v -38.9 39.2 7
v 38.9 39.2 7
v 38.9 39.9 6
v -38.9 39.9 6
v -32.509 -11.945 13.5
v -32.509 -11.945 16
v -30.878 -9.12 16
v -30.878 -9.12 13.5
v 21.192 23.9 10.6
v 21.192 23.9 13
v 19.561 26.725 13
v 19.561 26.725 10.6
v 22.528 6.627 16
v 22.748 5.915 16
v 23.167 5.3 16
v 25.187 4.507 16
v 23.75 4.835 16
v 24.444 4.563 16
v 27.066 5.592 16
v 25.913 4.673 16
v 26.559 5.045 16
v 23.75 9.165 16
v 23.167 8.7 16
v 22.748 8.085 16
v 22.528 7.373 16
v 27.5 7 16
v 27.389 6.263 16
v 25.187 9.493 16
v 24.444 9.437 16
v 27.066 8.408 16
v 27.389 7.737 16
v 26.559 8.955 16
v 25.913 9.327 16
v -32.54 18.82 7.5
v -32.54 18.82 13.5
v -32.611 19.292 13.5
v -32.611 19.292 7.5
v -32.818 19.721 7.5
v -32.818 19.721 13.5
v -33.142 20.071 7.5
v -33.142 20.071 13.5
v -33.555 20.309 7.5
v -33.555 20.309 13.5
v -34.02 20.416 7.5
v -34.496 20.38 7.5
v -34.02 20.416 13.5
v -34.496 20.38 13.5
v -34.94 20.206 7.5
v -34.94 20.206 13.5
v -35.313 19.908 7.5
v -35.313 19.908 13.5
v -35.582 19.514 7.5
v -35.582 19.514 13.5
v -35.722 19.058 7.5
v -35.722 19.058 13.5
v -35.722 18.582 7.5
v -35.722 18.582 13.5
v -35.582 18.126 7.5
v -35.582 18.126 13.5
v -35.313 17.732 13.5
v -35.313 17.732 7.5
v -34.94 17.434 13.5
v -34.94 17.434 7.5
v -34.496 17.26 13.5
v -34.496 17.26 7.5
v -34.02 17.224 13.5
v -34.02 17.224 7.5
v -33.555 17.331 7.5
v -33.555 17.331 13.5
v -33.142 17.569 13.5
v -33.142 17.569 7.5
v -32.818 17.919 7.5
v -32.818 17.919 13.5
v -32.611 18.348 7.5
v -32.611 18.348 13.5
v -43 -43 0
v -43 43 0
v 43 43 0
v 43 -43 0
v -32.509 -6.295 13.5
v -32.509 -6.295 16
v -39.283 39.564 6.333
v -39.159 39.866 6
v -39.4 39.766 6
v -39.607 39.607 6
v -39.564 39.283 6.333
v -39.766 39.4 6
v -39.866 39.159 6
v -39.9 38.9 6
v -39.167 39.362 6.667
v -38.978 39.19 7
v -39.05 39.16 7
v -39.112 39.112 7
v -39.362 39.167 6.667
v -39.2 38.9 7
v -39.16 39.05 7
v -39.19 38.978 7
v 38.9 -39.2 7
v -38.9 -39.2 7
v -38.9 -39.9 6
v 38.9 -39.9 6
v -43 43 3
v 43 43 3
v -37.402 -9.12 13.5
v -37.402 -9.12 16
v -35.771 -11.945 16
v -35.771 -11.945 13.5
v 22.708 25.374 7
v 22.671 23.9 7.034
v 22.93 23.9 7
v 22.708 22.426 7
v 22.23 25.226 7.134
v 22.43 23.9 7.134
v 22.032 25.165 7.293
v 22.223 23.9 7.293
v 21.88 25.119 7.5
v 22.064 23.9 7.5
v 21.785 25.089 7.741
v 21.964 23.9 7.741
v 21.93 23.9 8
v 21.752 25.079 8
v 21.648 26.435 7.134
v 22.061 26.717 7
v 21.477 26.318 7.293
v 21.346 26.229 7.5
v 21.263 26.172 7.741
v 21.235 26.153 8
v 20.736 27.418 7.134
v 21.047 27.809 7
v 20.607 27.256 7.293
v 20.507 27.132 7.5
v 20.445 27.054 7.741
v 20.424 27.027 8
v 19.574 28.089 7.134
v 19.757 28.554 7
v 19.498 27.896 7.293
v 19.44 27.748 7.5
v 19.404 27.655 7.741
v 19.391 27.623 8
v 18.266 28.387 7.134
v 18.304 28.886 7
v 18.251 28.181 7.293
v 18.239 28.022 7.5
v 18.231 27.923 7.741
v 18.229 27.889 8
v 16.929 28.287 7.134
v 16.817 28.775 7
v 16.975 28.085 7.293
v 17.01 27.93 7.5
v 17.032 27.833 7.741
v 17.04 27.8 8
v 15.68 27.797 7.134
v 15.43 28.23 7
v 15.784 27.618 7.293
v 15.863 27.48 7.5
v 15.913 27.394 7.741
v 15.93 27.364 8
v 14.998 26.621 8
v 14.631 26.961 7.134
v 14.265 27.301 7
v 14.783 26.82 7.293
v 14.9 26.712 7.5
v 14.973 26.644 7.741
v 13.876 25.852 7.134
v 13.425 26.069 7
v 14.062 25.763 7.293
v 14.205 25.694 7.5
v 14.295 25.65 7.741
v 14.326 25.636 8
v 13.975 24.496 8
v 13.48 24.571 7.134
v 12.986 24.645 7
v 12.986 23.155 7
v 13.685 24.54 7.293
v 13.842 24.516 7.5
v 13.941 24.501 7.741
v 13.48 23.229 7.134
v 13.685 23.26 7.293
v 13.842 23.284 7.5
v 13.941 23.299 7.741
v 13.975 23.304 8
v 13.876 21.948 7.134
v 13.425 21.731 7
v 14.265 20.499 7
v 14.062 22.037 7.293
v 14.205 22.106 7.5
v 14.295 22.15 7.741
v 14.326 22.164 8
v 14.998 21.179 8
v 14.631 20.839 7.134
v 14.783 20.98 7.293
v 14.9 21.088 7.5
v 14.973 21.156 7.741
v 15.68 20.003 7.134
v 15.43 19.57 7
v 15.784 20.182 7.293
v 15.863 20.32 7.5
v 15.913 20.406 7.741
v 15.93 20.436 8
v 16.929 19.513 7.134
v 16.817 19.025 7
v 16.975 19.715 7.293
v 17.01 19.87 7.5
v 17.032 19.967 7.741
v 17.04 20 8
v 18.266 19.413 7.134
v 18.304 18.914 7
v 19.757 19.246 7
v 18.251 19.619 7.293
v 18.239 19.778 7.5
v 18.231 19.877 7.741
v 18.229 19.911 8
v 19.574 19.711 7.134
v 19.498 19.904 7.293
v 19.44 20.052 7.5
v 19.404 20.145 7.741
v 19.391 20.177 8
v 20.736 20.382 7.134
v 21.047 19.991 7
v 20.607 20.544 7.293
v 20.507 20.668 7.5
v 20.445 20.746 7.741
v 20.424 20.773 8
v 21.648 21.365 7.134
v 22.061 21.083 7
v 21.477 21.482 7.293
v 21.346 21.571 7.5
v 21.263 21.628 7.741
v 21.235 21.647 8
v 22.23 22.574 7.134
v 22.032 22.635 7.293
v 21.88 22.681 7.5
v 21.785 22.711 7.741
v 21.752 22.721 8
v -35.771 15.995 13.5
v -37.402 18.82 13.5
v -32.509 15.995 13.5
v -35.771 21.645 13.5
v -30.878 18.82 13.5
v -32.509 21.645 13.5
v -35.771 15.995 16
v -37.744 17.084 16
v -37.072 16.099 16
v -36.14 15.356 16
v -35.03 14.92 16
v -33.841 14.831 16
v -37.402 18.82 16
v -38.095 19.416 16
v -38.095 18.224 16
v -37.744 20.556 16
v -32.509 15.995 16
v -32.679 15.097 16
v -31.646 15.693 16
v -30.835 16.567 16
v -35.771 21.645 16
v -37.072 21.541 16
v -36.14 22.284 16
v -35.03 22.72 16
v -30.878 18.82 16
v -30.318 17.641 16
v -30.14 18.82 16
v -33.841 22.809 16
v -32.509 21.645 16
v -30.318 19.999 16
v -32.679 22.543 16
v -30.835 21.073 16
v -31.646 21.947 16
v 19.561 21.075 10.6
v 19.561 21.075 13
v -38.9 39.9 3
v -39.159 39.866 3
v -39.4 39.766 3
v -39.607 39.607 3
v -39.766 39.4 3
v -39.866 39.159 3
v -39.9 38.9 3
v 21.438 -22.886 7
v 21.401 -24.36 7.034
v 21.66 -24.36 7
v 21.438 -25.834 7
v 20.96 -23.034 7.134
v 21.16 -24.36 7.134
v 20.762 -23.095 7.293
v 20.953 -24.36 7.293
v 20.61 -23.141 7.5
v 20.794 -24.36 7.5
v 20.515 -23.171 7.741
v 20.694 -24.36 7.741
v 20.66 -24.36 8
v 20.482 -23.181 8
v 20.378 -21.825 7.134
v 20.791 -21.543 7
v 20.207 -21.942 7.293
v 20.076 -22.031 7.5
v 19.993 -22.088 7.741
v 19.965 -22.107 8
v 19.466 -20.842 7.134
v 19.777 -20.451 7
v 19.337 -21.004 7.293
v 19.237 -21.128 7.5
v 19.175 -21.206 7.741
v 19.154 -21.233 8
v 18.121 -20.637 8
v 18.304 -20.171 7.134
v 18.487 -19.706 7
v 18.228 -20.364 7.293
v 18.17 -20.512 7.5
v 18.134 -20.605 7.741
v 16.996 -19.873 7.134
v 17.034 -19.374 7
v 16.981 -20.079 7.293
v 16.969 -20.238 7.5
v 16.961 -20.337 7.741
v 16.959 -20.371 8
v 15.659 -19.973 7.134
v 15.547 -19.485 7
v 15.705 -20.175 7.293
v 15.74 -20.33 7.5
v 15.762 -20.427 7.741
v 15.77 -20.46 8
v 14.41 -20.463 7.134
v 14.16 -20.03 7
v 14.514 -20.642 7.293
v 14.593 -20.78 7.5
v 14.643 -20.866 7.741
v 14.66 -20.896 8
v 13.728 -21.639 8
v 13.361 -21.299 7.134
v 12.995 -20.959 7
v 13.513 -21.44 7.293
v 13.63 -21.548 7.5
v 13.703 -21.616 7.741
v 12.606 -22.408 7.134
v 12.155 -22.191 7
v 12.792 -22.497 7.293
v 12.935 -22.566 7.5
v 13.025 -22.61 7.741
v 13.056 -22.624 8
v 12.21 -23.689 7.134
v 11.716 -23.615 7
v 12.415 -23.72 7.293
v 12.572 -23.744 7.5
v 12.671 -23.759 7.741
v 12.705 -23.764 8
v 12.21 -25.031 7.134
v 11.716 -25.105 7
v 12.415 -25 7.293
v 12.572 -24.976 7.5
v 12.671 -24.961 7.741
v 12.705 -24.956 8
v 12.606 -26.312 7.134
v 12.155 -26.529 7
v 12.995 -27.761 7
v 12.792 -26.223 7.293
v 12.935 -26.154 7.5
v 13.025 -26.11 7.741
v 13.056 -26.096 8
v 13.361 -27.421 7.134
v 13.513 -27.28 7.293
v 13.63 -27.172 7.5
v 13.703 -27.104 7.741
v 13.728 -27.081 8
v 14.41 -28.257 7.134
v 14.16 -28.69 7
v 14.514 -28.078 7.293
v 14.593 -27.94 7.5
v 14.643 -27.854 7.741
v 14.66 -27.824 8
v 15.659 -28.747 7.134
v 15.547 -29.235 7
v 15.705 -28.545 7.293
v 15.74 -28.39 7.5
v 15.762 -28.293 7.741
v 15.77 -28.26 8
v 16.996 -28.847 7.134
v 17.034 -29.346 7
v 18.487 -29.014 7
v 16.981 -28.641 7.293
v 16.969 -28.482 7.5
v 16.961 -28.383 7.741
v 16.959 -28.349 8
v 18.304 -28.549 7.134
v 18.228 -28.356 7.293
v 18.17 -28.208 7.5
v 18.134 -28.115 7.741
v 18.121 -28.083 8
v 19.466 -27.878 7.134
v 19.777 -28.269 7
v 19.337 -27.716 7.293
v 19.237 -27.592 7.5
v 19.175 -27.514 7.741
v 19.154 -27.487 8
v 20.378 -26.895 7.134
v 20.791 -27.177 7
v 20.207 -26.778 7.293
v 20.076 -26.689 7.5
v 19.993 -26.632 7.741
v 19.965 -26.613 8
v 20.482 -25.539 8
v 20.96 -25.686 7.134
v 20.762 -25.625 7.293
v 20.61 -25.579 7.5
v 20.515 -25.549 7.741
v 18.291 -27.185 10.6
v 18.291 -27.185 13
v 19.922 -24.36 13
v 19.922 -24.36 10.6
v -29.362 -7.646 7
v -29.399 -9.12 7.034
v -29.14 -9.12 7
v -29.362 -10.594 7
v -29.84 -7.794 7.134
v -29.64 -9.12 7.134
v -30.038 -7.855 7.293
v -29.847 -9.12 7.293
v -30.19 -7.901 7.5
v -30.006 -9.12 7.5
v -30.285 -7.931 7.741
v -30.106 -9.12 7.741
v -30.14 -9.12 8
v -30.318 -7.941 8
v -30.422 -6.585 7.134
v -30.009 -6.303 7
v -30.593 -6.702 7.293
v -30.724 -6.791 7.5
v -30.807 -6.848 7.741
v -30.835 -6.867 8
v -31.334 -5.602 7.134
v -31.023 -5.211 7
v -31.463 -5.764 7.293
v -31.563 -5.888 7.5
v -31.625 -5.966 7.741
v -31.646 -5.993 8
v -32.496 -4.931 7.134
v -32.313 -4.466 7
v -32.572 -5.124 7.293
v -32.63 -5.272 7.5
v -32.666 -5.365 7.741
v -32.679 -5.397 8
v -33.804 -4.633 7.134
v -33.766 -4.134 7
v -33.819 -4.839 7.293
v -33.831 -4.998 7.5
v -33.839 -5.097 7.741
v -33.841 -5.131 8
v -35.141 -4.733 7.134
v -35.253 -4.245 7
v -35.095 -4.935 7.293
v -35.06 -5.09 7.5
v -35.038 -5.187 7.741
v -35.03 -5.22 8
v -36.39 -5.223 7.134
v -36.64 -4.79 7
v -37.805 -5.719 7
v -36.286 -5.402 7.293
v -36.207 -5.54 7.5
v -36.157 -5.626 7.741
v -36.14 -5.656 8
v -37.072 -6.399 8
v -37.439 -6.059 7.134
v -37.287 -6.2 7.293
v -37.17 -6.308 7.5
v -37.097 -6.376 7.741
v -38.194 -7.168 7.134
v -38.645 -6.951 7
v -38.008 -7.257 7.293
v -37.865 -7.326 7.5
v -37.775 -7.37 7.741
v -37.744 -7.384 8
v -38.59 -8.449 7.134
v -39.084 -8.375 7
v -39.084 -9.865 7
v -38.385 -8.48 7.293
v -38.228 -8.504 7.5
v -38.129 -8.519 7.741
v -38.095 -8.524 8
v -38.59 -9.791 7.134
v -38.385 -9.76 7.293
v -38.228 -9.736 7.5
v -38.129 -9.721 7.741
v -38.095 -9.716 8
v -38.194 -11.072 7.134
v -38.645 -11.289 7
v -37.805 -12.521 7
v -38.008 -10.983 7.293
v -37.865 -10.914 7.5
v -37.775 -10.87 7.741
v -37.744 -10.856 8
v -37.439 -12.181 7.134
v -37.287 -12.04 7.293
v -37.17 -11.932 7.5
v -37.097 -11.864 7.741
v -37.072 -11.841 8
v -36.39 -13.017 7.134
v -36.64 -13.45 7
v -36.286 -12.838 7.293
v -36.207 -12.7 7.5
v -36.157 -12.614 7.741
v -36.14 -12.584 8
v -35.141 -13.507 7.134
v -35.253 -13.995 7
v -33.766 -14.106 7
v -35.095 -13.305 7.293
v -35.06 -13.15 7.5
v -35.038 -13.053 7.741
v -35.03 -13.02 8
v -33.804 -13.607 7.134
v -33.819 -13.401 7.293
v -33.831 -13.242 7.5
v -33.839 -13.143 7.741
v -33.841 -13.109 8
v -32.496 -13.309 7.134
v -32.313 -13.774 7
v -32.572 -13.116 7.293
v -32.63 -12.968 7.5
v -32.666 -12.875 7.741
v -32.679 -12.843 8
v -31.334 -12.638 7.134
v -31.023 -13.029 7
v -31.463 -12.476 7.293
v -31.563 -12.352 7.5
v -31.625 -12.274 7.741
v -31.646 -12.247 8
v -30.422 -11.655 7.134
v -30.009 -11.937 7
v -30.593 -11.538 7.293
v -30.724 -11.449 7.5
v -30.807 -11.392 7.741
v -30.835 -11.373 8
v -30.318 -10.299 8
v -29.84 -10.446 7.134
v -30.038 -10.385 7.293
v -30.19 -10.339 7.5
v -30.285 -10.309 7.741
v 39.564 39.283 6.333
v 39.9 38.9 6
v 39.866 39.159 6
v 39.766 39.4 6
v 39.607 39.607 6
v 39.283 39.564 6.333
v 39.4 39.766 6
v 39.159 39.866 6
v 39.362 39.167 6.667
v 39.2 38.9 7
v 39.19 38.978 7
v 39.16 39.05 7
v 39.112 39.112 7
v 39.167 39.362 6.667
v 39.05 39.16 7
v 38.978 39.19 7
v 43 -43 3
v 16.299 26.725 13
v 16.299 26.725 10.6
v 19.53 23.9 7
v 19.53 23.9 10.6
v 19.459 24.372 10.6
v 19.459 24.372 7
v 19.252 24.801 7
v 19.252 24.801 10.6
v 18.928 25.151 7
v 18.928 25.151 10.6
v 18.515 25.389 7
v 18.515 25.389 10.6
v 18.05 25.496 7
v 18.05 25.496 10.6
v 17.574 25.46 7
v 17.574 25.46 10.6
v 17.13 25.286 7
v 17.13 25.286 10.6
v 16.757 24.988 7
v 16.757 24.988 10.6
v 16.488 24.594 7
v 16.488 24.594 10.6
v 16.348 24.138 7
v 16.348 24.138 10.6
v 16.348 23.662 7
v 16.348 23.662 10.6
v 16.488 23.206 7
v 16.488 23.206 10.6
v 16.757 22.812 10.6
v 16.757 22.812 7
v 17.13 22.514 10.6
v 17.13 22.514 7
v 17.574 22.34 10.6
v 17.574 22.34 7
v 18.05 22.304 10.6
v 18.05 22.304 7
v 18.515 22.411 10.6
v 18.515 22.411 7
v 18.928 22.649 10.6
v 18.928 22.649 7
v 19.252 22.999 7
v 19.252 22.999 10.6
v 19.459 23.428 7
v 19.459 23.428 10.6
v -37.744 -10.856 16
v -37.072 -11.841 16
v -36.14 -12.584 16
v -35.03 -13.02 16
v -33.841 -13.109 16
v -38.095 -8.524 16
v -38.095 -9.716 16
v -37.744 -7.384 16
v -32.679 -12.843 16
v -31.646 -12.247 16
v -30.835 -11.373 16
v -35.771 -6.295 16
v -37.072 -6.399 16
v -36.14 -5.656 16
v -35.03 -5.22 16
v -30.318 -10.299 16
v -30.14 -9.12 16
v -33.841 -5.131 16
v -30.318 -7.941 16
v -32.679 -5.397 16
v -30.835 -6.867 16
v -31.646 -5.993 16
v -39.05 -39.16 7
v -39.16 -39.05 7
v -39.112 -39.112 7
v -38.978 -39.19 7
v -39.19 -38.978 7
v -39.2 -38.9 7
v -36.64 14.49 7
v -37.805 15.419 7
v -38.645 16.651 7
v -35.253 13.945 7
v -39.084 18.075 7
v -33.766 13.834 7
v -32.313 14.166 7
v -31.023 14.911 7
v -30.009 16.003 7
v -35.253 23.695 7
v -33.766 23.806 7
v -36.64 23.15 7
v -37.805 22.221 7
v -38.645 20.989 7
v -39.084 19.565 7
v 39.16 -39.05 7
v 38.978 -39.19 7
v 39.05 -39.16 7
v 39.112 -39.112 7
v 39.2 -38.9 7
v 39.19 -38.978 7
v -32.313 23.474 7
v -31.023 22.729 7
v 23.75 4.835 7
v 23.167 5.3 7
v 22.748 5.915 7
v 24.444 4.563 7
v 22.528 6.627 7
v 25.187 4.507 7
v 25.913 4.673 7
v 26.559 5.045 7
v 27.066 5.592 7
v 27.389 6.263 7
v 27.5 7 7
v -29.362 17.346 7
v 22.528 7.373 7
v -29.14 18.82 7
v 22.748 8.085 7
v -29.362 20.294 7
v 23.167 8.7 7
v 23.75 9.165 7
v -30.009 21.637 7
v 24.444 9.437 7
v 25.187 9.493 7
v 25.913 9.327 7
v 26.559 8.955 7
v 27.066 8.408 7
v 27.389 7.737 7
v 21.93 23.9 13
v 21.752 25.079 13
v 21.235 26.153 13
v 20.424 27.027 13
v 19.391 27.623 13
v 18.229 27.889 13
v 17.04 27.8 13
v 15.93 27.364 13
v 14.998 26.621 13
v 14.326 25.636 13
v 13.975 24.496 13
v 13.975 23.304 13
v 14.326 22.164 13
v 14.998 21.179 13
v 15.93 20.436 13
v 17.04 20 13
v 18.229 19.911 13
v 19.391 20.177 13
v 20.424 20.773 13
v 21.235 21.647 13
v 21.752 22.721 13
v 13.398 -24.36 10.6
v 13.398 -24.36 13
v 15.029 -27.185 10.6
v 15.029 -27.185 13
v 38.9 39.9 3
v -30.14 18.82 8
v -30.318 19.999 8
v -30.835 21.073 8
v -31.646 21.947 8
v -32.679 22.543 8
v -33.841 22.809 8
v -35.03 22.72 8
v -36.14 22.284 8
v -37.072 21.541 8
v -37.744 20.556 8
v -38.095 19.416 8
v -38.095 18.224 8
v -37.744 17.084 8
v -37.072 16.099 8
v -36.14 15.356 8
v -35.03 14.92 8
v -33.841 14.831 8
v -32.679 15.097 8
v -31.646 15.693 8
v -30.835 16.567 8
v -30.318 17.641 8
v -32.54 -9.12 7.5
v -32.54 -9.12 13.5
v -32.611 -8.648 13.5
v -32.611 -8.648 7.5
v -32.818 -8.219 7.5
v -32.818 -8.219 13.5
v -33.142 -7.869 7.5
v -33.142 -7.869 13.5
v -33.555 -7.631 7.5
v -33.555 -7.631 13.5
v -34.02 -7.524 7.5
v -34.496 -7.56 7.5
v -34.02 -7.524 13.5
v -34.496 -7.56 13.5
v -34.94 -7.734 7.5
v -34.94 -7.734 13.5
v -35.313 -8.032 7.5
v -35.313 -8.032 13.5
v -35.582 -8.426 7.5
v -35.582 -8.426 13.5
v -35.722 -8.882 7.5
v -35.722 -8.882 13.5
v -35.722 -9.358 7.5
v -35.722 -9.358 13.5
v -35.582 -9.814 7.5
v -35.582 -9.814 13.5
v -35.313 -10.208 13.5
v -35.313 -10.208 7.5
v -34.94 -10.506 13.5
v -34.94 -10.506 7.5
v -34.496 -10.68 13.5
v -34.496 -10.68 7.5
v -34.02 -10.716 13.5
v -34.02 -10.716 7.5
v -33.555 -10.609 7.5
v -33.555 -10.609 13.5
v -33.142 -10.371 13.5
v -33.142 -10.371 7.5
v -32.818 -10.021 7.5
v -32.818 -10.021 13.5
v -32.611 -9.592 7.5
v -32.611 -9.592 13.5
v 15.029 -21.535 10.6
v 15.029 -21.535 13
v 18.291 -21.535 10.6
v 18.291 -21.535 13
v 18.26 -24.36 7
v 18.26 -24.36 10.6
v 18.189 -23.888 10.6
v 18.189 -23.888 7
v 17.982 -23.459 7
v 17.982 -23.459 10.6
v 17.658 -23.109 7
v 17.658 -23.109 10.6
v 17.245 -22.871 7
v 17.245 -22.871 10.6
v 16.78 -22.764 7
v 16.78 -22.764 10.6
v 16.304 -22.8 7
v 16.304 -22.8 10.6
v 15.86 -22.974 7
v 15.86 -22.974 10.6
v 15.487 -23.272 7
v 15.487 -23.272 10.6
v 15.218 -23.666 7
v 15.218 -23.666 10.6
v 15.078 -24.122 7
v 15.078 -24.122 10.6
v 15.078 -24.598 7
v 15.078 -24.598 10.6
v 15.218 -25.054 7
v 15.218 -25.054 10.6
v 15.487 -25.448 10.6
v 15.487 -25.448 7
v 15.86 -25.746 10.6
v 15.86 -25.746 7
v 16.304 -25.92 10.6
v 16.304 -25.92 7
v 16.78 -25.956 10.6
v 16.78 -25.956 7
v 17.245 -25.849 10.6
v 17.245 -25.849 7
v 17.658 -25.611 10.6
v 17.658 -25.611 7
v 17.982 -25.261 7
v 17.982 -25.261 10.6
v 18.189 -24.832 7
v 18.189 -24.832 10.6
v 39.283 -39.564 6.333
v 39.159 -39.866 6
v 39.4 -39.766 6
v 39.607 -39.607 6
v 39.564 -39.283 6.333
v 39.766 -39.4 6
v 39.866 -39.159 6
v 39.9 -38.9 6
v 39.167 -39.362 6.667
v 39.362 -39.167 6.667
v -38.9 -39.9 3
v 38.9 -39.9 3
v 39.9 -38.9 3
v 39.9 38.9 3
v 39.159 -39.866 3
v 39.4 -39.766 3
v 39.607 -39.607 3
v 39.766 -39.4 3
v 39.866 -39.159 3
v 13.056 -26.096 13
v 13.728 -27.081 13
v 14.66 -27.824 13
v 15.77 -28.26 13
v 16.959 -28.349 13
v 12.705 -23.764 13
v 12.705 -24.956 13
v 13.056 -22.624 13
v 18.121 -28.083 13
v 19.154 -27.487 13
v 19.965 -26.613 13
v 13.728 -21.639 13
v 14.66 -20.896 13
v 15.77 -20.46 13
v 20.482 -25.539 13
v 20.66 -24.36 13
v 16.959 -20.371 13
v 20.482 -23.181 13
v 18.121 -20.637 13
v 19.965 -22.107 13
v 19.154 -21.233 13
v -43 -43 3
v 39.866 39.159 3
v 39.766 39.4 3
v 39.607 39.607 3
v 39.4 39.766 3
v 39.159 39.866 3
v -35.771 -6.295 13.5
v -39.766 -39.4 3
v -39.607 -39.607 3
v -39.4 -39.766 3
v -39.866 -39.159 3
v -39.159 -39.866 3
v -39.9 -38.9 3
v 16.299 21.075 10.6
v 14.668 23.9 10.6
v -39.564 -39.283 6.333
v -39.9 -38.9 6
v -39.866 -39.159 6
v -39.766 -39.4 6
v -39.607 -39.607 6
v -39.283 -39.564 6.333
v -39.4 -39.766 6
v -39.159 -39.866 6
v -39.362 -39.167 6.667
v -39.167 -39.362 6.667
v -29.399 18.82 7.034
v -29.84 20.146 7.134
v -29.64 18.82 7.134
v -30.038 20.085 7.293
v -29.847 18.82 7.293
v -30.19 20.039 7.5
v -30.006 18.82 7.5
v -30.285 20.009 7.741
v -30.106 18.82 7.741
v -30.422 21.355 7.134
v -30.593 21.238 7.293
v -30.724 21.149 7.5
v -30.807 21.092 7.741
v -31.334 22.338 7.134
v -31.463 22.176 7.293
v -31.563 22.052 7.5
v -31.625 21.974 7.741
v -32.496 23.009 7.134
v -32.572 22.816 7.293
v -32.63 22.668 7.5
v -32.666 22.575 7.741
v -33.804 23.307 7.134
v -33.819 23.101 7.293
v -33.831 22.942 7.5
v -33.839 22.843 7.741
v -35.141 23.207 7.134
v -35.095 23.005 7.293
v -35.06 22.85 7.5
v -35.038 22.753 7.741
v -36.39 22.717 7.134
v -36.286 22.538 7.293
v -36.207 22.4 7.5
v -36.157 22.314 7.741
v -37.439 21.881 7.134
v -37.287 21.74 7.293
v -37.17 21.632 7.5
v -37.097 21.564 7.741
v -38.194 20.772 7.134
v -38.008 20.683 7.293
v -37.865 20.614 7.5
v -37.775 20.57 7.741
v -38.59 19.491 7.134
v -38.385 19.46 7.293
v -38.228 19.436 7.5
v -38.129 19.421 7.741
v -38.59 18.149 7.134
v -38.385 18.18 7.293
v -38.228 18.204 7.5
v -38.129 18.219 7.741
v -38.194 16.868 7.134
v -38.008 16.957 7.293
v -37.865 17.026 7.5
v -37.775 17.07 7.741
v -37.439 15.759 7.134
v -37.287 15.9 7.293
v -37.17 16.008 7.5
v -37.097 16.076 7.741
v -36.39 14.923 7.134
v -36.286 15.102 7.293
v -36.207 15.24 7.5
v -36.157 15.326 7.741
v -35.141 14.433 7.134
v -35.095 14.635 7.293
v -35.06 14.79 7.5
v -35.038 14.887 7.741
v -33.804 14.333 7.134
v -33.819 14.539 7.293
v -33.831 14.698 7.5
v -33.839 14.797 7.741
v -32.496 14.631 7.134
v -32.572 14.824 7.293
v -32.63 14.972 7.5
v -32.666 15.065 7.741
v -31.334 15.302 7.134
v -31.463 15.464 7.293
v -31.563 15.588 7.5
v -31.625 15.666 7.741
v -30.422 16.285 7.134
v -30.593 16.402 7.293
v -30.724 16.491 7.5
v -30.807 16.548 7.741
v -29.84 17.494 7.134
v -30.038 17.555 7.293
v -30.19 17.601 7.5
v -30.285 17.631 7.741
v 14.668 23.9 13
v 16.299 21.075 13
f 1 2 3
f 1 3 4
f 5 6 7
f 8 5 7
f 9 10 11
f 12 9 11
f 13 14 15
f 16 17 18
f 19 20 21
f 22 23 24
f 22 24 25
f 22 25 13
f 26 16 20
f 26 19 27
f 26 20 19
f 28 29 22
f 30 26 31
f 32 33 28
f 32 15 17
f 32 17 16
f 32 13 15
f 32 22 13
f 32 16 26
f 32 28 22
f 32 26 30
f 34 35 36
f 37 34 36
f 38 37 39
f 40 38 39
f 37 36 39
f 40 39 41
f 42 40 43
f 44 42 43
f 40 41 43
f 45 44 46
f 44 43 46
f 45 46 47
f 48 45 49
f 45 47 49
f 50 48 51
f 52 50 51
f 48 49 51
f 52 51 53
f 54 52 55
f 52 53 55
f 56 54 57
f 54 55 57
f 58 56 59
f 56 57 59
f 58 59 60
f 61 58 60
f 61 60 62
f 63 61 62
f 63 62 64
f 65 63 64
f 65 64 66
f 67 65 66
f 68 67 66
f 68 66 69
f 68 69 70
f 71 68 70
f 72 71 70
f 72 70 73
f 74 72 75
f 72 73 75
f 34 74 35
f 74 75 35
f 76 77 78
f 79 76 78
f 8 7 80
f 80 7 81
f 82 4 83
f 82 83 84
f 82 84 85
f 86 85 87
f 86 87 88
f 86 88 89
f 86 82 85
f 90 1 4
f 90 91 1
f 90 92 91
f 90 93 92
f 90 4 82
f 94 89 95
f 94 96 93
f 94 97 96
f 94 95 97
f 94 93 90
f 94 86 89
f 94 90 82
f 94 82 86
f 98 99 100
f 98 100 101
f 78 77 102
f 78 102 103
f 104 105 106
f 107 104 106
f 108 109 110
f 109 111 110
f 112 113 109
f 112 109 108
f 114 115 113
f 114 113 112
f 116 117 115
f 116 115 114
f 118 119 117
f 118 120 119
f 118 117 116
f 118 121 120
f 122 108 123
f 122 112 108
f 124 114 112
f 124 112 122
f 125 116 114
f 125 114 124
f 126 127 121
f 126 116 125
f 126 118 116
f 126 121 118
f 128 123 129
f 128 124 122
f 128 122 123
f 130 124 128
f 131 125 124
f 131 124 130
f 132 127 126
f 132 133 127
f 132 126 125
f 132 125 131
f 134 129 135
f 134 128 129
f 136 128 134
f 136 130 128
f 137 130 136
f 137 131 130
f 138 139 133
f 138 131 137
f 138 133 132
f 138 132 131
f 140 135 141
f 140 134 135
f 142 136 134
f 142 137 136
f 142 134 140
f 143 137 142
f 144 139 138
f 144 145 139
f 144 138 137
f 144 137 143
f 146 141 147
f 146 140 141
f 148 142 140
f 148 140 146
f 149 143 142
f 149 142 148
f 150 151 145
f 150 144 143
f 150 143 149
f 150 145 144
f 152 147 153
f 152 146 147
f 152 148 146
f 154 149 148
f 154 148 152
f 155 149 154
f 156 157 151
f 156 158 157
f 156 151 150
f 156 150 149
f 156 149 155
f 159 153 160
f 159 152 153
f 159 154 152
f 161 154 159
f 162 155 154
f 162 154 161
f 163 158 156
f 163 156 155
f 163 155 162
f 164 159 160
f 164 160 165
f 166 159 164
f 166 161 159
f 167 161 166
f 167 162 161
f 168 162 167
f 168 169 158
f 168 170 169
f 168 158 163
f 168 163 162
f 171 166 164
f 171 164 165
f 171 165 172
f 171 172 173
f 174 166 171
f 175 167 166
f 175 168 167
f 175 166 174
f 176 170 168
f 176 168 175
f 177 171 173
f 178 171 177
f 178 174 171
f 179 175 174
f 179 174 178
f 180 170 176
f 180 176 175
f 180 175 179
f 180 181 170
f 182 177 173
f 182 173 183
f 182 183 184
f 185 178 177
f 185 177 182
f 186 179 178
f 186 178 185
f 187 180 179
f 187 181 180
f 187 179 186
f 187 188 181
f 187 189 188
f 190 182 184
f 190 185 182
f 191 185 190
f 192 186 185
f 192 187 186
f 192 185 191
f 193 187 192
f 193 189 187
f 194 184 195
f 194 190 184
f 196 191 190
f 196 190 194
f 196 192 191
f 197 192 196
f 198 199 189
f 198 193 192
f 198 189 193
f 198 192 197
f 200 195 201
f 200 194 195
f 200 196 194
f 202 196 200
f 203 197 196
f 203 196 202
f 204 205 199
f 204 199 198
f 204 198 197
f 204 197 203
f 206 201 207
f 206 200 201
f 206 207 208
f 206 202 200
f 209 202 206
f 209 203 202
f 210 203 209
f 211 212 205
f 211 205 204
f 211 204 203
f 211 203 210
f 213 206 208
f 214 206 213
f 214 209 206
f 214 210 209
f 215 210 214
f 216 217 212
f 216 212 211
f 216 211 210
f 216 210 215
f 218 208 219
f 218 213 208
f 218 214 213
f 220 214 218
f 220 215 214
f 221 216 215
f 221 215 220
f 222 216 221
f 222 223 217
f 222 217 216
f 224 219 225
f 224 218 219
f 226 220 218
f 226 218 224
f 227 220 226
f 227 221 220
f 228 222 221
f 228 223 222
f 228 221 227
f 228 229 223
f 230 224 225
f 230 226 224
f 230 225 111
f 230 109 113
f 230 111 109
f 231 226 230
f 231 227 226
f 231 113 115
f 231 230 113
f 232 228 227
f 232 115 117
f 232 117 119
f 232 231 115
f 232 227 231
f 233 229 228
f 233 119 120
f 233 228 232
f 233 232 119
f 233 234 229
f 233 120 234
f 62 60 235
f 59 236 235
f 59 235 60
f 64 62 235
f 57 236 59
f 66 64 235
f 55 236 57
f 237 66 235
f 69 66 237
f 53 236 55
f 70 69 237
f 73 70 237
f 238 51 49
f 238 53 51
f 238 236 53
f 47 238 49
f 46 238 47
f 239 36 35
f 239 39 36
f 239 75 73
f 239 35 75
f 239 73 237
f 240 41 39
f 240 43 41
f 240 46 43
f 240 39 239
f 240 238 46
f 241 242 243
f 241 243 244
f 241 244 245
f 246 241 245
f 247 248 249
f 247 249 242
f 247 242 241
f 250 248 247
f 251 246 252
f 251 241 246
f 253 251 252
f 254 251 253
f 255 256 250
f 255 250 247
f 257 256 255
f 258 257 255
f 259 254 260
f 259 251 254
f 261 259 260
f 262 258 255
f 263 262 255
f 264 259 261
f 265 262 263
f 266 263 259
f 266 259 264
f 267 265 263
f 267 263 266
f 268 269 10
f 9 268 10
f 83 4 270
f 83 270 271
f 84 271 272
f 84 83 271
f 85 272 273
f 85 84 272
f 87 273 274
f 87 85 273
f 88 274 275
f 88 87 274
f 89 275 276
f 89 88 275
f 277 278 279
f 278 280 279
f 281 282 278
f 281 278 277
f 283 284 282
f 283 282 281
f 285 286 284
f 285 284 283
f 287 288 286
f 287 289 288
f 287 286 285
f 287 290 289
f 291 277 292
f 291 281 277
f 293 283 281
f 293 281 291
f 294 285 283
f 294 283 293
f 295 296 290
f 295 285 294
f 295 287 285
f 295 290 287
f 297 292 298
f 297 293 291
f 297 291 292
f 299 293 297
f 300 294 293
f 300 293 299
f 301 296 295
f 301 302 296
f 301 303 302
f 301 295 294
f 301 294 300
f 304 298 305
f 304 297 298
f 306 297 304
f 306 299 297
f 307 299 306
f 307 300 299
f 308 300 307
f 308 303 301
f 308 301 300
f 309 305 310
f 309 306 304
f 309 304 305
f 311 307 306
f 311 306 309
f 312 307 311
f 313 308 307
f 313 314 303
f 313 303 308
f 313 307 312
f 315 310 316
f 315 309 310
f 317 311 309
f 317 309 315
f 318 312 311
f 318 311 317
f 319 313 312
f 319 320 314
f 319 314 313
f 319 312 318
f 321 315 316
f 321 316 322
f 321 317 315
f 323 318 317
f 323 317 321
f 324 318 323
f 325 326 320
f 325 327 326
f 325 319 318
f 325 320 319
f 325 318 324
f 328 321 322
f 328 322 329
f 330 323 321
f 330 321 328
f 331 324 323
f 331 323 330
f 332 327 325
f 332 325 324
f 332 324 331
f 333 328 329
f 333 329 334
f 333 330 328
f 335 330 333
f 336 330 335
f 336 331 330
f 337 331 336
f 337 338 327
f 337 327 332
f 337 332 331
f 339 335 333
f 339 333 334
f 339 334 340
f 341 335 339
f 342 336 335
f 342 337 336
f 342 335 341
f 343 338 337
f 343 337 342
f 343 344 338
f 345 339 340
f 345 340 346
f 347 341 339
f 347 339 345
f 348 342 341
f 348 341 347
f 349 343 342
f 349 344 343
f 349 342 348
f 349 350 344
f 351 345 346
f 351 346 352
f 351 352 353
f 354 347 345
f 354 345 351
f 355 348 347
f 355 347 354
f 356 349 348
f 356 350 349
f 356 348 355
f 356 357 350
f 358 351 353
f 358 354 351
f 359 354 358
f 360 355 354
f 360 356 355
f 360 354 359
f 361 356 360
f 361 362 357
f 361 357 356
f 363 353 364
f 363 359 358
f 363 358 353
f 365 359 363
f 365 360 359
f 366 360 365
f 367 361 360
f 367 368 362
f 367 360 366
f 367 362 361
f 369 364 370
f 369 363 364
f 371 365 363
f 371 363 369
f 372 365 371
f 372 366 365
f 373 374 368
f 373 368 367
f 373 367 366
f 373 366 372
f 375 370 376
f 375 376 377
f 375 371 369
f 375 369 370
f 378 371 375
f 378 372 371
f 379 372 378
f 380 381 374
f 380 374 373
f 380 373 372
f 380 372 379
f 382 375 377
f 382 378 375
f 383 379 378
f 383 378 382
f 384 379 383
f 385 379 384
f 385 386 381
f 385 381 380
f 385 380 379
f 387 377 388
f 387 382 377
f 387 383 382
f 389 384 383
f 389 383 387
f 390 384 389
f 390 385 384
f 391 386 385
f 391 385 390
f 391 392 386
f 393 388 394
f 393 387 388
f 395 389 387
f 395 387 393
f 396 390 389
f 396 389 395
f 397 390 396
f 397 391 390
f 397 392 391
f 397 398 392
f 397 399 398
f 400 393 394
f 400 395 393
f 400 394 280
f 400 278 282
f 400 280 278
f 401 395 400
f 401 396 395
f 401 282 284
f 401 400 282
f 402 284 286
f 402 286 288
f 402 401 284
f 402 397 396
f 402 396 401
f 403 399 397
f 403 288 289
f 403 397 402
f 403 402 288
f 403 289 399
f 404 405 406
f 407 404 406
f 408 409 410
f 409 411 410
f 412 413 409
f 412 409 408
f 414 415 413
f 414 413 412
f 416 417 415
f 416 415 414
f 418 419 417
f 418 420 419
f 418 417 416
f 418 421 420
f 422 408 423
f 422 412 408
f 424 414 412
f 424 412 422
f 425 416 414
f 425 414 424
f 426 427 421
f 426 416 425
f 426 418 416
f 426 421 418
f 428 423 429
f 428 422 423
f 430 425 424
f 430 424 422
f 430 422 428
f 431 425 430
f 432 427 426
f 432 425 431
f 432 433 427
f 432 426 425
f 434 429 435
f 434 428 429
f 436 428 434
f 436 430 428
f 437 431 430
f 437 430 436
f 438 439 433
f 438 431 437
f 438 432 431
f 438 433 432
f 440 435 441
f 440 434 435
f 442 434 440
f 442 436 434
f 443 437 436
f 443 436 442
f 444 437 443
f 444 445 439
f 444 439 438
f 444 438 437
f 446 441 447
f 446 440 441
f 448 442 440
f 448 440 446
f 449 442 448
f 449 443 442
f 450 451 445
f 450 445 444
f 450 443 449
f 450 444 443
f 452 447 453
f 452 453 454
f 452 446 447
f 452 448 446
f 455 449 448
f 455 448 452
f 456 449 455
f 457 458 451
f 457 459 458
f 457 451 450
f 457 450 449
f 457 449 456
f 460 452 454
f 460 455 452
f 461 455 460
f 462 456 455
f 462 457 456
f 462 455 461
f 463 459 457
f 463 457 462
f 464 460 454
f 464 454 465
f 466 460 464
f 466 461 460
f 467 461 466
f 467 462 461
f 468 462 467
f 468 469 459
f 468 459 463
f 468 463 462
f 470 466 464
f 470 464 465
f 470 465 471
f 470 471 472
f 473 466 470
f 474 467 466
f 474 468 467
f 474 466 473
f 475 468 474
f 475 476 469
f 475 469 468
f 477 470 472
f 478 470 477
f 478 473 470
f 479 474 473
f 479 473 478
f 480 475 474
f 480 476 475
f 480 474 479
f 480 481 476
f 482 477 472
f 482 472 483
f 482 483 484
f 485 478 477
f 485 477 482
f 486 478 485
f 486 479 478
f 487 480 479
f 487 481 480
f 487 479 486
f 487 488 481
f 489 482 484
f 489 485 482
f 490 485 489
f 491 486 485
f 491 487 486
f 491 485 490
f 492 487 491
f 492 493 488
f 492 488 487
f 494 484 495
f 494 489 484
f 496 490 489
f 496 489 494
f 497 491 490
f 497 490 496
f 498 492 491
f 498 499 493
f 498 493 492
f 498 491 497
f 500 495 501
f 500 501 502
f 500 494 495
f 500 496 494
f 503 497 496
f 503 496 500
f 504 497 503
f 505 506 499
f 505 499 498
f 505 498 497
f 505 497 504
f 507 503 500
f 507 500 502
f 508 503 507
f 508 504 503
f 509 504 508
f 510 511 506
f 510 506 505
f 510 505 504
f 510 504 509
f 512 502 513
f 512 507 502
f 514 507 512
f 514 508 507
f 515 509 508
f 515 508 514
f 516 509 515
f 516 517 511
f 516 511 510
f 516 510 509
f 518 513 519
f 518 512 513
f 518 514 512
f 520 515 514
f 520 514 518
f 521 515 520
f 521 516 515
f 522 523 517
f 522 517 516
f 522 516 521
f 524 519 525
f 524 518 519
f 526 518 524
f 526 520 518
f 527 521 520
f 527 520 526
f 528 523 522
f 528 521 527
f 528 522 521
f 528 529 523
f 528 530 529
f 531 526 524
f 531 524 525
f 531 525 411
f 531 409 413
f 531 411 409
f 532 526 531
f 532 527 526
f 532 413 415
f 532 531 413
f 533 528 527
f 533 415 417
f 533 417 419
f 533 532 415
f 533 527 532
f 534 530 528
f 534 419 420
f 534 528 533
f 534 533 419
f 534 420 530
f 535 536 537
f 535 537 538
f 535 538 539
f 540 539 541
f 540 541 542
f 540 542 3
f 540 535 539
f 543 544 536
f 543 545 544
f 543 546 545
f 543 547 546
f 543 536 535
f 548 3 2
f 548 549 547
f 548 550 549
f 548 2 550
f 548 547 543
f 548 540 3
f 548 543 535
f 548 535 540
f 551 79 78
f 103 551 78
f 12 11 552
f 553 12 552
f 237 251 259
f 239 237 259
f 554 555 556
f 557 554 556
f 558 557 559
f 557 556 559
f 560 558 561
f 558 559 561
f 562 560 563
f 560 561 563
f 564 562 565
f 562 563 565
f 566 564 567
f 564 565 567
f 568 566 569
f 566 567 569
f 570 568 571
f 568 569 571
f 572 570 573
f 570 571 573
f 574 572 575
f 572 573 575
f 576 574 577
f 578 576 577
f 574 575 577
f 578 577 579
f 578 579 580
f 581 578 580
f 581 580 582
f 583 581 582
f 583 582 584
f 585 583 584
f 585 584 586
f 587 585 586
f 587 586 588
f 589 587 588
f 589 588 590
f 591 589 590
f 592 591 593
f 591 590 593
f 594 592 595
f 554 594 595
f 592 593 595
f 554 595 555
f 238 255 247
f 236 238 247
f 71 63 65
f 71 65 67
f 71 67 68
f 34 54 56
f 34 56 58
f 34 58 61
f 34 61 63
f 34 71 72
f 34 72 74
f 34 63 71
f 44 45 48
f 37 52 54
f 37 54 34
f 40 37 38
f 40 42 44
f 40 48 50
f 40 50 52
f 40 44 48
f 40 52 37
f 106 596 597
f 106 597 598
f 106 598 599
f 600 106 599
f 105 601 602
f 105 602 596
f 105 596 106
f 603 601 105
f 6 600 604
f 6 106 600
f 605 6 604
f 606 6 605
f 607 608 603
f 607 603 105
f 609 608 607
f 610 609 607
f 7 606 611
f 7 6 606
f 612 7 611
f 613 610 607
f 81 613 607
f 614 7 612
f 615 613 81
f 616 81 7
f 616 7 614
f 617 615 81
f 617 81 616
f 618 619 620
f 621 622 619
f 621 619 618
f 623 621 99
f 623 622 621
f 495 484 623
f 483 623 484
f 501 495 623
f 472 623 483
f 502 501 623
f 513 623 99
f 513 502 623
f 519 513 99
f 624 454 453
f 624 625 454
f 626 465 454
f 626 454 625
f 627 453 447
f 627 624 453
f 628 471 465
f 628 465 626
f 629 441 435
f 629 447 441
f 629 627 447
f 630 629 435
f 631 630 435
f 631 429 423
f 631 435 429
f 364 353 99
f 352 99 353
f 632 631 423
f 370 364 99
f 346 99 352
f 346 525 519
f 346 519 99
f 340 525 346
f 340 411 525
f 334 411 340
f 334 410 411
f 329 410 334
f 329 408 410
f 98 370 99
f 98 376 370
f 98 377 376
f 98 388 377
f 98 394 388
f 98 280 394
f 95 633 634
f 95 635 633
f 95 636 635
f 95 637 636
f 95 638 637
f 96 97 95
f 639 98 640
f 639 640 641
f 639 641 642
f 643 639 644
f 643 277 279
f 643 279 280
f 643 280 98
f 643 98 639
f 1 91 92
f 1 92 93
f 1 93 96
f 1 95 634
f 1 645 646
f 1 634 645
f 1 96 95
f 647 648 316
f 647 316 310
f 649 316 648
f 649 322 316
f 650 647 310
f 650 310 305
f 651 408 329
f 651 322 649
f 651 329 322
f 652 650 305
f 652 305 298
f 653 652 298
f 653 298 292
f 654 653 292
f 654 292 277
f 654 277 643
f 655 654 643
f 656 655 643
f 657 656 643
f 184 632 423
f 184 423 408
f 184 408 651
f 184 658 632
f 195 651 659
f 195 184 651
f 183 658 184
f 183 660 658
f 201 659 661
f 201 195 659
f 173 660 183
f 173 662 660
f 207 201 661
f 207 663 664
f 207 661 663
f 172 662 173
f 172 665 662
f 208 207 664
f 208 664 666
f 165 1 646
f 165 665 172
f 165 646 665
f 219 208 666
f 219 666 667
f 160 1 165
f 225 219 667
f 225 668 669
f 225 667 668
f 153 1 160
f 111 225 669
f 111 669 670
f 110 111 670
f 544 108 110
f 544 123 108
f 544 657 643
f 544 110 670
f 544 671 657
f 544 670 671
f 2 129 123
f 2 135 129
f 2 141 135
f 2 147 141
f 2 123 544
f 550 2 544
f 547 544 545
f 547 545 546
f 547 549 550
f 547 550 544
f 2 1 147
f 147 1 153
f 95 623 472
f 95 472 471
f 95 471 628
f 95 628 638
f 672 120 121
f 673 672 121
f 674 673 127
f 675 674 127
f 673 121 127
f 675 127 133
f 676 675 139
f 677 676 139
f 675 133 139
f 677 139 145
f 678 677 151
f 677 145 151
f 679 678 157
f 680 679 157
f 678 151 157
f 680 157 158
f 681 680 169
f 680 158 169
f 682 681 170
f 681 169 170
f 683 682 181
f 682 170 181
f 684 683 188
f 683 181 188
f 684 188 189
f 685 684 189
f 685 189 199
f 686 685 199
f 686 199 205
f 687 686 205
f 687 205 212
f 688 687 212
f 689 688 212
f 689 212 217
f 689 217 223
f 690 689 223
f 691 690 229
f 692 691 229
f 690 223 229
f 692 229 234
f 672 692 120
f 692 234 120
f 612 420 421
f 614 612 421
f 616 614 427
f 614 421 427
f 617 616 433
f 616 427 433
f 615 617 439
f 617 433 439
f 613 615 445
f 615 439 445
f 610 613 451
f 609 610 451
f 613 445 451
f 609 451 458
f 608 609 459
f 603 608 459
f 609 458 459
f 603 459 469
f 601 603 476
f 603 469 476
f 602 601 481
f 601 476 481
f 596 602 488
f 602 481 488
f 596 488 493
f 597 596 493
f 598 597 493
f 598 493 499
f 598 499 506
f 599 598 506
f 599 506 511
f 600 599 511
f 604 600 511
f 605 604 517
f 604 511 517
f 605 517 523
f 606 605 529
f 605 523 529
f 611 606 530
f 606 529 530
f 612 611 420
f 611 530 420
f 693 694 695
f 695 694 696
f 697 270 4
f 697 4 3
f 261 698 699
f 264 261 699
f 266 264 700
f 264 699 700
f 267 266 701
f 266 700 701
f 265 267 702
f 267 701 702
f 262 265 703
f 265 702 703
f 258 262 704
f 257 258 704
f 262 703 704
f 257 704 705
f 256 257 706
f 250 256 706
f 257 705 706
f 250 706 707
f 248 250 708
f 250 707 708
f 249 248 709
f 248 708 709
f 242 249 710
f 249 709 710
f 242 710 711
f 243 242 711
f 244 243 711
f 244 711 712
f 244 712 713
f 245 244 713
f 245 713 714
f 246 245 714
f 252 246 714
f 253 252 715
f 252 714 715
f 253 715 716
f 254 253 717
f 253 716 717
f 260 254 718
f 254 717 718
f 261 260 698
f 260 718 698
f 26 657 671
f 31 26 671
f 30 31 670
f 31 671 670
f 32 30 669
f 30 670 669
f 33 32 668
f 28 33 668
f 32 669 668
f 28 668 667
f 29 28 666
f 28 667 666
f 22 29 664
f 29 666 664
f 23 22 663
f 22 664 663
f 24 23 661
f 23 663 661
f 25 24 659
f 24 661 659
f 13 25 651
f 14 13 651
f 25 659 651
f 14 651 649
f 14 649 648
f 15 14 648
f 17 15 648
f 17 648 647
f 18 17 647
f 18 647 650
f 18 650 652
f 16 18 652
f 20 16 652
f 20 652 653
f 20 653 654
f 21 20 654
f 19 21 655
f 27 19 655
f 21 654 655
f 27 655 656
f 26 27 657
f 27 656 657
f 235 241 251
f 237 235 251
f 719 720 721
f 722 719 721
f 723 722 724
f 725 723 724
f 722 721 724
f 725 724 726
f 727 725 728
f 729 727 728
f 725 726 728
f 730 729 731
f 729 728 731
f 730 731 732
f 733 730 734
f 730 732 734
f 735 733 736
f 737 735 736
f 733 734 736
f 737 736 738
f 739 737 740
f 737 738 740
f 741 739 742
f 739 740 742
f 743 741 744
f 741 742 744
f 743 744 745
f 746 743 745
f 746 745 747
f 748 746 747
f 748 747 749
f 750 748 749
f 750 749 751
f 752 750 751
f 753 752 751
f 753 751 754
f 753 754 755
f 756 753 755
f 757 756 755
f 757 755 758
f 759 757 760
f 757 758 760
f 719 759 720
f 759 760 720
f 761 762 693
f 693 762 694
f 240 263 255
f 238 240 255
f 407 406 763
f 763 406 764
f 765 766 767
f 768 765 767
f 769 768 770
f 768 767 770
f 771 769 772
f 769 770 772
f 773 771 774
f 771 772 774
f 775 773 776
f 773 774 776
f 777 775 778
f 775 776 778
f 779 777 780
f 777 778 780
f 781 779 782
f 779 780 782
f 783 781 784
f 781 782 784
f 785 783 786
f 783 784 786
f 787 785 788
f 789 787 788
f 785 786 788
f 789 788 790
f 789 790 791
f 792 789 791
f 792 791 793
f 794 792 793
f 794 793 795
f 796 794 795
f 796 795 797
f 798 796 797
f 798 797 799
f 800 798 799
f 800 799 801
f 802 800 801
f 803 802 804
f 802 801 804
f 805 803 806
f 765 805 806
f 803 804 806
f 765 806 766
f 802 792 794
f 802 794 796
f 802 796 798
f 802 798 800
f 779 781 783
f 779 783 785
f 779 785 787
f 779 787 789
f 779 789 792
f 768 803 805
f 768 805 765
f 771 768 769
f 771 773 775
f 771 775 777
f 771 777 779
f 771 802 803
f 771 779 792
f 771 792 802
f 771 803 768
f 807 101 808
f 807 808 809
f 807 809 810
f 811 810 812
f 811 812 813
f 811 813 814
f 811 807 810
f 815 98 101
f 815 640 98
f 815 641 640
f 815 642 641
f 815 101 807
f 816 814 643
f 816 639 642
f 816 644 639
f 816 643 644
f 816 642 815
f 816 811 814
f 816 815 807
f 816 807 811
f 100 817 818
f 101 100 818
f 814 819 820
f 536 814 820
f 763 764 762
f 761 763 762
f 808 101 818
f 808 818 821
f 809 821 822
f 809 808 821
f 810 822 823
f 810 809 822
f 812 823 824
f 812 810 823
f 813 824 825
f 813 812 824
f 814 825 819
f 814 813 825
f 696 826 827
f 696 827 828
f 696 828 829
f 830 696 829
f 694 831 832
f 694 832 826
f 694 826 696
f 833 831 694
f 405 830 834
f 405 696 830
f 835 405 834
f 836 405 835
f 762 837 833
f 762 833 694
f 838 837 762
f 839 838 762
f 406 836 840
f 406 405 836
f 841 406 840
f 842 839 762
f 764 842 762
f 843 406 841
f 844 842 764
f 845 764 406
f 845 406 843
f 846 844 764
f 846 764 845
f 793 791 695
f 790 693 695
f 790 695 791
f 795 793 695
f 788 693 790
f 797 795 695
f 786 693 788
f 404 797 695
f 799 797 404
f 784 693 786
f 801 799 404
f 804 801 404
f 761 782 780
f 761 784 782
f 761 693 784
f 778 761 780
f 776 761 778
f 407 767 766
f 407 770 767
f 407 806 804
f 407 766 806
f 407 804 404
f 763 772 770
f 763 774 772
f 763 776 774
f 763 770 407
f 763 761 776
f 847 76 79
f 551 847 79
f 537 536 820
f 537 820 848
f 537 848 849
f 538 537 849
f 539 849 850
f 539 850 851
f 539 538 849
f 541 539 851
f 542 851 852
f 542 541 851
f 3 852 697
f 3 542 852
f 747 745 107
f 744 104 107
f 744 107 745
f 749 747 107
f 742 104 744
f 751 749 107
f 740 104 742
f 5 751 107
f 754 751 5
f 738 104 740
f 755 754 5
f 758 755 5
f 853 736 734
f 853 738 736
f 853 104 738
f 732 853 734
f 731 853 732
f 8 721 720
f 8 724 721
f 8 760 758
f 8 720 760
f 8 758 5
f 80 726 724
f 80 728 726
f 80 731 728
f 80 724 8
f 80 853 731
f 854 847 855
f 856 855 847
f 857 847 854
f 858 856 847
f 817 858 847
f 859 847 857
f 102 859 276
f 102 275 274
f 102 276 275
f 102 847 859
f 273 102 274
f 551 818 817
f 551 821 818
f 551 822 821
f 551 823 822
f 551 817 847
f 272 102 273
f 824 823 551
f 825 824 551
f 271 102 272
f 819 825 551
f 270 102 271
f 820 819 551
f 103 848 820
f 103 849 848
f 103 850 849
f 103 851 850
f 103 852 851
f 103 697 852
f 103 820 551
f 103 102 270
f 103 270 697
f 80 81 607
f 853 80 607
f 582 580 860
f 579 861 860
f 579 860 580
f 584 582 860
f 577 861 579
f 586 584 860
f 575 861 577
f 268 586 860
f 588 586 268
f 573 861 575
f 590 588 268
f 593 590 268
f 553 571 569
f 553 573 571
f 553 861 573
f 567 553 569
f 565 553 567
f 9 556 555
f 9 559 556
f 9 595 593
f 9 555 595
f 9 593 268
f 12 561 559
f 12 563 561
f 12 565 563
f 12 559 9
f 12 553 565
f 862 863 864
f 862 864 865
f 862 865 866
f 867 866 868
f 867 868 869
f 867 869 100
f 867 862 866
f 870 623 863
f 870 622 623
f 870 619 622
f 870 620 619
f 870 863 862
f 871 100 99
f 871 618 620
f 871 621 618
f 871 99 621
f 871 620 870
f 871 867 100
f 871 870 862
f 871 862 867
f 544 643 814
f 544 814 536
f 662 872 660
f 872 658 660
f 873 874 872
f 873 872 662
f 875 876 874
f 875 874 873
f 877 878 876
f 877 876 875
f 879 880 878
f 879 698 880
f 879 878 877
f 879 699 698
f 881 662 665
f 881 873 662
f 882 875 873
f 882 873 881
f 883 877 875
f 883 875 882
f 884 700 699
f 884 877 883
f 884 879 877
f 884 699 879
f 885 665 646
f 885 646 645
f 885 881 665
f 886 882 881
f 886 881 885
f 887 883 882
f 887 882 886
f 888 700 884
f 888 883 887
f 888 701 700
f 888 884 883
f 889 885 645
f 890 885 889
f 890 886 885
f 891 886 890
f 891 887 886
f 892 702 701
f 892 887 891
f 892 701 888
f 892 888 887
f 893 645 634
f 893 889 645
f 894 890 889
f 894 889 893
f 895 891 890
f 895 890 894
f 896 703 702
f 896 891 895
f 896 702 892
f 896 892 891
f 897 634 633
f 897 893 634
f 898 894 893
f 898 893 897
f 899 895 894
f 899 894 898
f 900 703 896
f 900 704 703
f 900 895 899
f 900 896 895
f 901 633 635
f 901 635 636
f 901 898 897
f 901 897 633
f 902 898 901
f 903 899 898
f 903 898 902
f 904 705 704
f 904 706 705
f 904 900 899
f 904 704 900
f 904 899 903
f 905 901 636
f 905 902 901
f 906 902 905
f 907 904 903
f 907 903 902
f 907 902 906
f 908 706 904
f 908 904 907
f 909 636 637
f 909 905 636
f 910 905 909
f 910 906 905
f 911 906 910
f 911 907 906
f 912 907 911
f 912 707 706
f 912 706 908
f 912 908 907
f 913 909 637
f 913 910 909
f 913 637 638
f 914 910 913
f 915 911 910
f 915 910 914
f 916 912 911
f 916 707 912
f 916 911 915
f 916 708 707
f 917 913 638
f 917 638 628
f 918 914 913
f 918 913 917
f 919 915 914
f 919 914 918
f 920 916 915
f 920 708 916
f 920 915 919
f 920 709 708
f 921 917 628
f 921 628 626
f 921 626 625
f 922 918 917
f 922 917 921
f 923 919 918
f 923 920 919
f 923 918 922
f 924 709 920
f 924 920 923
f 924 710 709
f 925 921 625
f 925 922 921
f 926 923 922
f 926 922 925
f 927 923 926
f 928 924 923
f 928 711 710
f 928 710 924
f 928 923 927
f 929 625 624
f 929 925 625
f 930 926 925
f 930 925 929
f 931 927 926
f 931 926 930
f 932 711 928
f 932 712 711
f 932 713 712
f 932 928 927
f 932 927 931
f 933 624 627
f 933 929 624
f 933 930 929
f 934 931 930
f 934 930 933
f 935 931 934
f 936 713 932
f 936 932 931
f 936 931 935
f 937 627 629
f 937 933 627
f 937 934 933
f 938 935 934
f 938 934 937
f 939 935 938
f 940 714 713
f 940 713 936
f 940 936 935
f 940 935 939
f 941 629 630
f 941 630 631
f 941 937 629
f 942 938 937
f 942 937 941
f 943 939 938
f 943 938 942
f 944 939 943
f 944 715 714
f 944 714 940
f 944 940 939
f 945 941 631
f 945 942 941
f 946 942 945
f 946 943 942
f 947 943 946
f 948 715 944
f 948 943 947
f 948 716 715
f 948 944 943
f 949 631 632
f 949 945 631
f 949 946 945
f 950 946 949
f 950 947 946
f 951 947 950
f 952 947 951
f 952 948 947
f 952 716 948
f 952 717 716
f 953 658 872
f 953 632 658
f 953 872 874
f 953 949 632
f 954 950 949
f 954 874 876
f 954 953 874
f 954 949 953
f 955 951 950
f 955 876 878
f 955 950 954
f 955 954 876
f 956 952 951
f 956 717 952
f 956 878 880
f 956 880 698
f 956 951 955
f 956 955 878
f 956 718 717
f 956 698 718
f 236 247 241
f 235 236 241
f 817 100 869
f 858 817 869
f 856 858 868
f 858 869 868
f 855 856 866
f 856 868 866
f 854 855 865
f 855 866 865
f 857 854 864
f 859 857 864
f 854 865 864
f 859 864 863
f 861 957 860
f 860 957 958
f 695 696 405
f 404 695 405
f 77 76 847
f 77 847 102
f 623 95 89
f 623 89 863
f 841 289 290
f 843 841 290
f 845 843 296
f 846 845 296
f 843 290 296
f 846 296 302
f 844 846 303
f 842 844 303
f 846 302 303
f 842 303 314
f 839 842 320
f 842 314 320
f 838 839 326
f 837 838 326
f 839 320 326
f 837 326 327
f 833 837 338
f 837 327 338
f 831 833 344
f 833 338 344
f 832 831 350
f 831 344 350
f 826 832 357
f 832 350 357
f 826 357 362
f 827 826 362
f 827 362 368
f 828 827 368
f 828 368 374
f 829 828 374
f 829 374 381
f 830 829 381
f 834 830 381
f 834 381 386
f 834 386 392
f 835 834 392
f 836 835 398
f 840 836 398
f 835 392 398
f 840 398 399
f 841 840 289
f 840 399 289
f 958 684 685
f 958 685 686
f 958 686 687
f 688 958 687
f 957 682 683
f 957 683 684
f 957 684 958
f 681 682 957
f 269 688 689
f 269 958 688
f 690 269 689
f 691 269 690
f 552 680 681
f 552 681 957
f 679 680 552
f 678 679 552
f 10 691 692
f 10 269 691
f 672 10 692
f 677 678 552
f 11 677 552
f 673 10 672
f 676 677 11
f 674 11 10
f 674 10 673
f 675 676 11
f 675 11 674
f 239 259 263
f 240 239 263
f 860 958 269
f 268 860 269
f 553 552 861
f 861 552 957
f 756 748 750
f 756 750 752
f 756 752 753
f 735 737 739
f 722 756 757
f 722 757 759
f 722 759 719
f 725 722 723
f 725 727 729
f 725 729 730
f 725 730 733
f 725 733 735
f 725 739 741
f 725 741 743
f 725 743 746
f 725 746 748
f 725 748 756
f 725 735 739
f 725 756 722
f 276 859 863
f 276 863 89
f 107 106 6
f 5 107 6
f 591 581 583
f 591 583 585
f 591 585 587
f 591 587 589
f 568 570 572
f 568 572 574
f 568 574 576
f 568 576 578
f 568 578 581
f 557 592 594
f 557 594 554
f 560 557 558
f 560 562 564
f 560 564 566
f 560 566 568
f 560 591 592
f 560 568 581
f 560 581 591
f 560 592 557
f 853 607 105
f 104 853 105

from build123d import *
from OCP.BRepFilletAPI import BRepFilletAPI_MakeChamfer

# Parameters (mm, degrees)
SKETCH1_W           = 86
SKETCH1_H           = 86
BOSS_EXTRUDE1_DEPTH = 3
SKETCH2_W           = 79.8
SKETCH2_H           = 79.8
BOSS_EXTRUDE2_DEPTH = 4
SKETCH3_R           = 4
BOSS_EXTRUDE3_DEPTH = 9
SKETCH5_3_R         = 4
BOSS_EXTRUDE4_DEPTH = 6
FILLET1_R           = 1
CUT_EXTRUDE1_DEPTH  = 2.4
SKETCH5_R           = 1.6
CUT_EXTRUDE2_DEPTH  = 3.6
CUT_EXTRUDE3_DEPTH  = 2.5
SKETCH7_R           = 1.6
CUT_EXTRUDE4_DEPTH  = 6
SKETCH8_R           = 2.5
BOSS_EXTRUDE5_DEPTH = 9
CHAMFER1_SIZE       = 1
CHAMFER1_SIZE2      = 0.700207538


with BuildPart() as part:
    # Sketch1 → Boss-Extrude1 (new body)
    with BuildSketch(Plane.XY):
        Rectangle(SKETCH1_W, SKETCH1_H)
    extrude(amount=BOSS_EXTRUDE1_DEPTH)

    # Sketch2 → Boss-Extrude2 (add)
    with BuildSketch(Plane.XY.offset(3)):
        Rectangle(SKETCH2_W, SKETCH2_H)
    extrude(amount=BOSS_EXTRUDE2_DEPTH)

    # Sketch3 → Boss-Extrude3 (add)
    with BuildSketch(Plane.XY.offset(7)):
        with Locations((-34.14, 18.82)):
            Circle(SKETCH3_R)
        with Locations((-34.14, -9.12)):
            Circle(SKETCH3_R)
    extrude(amount=BOSS_EXTRUDE3_DEPTH)

    # Sketch5<3> → Boss-Extrude4 (add)
    with BuildSketch(Plane.XY.offset(7)):
        with Locations((17.93, 23.9)):
            Circle(SKETCH5_3_R)
        with Locations((16.66, -24.36)):
            Circle(SKETCH5_3_R)
    extrude(amount=BOSS_EXTRUDE4_DEPTH)

    # Fillet1
    fillet1_edges = [part.edges().sort_by_distance(p)[0] for p in [
        (-39.9, -39.9, 5),
        (39.9, -39.9, 5),
        (39.9, 39.9, 5),
        (-39.9, 39.9, 5),
        (-38.14, 18.82, 7),
        (-38.14, -9.12, 7),
        (13.93, 23.9, 7),
        (12.66, -24.36, 7),
    ]]
    fillet(fillet1_edges, radius=FILLET1_R)

    # Sketch4 → Cut-Extrude1 (cut)
    with BuildSketch(Plane.XY.offset(13)):
        Polygon((13.397970979, -24.36), (15.02898549, -27.185), (18.29101451, -27.185), (19.922029021, -24.36), (18.29101451, -21.535), (15.02898549, -21.535), align=None)
        Polygon((14.667970979, 23.9), (16.29898549, 21.075), (19.56101451, 21.075), (21.192029021, 23.9), (19.56101451, 26.725), (16.29898549, 26.725), align=None)
    extrude(amount=-CUT_EXTRUDE1_DEPTH, mode=Mode.SUBTRACT)

    # Sketch5 → Cut-Extrude2 (cut)
    with BuildSketch(Plane.XY.offset(10.6)):
        with Locations((17.93, 23.9)):
            Circle(SKETCH5_R)
        with Locations((16.66, -24.36)):
            Circle(SKETCH5_R)
    extrude(amount=-CUT_EXTRUDE2_DEPTH, mode=Mode.SUBTRACT)

    # Sketch6 → Cut-Extrude3 (cut)
    with BuildSketch(Plane.XY.offset(16)):
        Polygon((-37.402029021, 18.82), (-35.77101451, 15.995), (-32.50898549, 15.995), (-30.877970979, 18.82), (-32.50898549, 21.645), (-35.77101451, 21.645), align=None)
        Polygon((-37.402029021, -9.12), (-35.77101451, -11.945), (-32.50898549, -11.945), (-30.877970979, -9.12), (-32.50898549, -6.295), (-35.77101451, -6.295), align=None)
    extrude(amount=-CUT_EXTRUDE3_DEPTH, mode=Mode.SUBTRACT)

    # Sketch7 → Cut-Extrude4 (cut)
    with BuildSketch(Plane.XY.offset(13.5)):
        with Locations((-34.14, 18.82)):
            Circle(SKETCH7_R)
        with Locations((-34.14, -9.12)):
            Circle(SKETCH7_R)
    extrude(amount=-CUT_EXTRUDE4_DEPTH, mode=Mode.SUBTRACT)

    # Sketch8 → Boss-Extrude5 (add)
    with BuildSketch(Plane.XY.offset(7)):
        with Locations((25, 7)):
            Circle(SKETCH8_R)
    extrude(amount=BOSS_EXTRUDE5_DEPTH)

    # Chamfer1: one chamfer whose edges measure the first distance from different faces: ONE call of the kernel's chamfer builder (chamfer() names one face for all edges)
    chamfer1_edges_1 = [part.edges().sort_by_distance(p)[0] for p in [
        (0, -39.9, 7),
    ]]
    chamfer1_side_1 = [part.faces().sort_by_distance(p)[0] for p in [
        (0, -39.9, 5),
    ]]
    chamfer1_edges_2 = [part.edges().sort_by_distance(p)[0] for p in [
        (39.9, 0, 7),
    ]]
    chamfer1_side_2 = [part.faces().sort_by_distance(p)[0] for p in [
        (39.9, 0, 5),
    ]]
    chamfer1_edges_3 = [part.edges().sort_by_distance(p)[0] for p in [
        (0, 39.9, 7),
    ]]
    chamfer1_side_3 = [part.faces().sort_by_distance(p)[0] for p in [
        (0, 39.9, 5),
    ]]
    chamfer1_edges_4 = [part.edges().sort_by_distance(p)[0] for p in [
        (-39.9, 0, 7),
    ]]
    chamfer1_side_4 = [part.faces().sort_by_distance(p)[0] for p in [
        (-39.9, 0, 5),
    ]]
    chamfer1_edges_5 = [part.edges().sort_by_distance(p)[0] for p in [
        (-39.607106781, 39.607106781, 7),
    ]]
    chamfer1_side_5 = [part.faces().sort_by_distance(p)[0] for p in [
        (-39.607106781, 39.607106781, 5),
    ]]
    chamfer1_edges_6 = [part.edges().sort_by_distance(p)[0] for p in [
        (-39.607106781, -39.607106781, 7),
    ]]
    chamfer1_side_6 = [part.faces().sort_by_distance(p)[0] for p in [
        (-39.607106781, -39.607106781, 5),
    ]]
    chamfer1_edges_7 = [part.edges().sort_by_distance(p)[0] for p in [
        (39.607106781, -39.607106781, 7),
    ]]
    chamfer1_side_7 = [part.faces().sort_by_distance(p)[0] for p in [
        (39.607106781, -39.607106781, 5),
    ]]
    chamfer1_edges_8 = [part.edges().sort_by_distance(p)[0] for p in [
        (39.607106781, 39.607106781, 7),
    ]]
    chamfer1_side_8 = [part.faces().sort_by_distance(p)[0] for p in [
        (39.607106781, 39.607106781, 5),
    ]]
    chamfer1 = BRepFilletAPI_MakeChamfer(part.part.solid().wrapped)
    for e in chamfer1_edges_1:
        chamfer1.Add(CHAMFER1_SIZE, CHAMFER1_SIZE2, e.wrapped, chamfer1_side_1[0].wrapped)  # the first distance lies on this face
    for e in chamfer1_edges_2:
        chamfer1.Add(CHAMFER1_SIZE, CHAMFER1_SIZE2, e.wrapped, chamfer1_side_2[0].wrapped)  # the first distance lies on this face
    for e in chamfer1_edges_3:
        chamfer1.Add(CHAMFER1_SIZE, CHAMFER1_SIZE2, e.wrapped, chamfer1_side_3[0].wrapped)  # the first distance lies on this face
    for e in chamfer1_edges_4:
        chamfer1.Add(CHAMFER1_SIZE, CHAMFER1_SIZE2, e.wrapped, chamfer1_side_4[0].wrapped)  # the first distance lies on this face
    for e in chamfer1_edges_5:
        chamfer1.Add(CHAMFER1_SIZE, CHAMFER1_SIZE2, e.wrapped, chamfer1_side_5[0].wrapped)  # the first distance lies on this face
    for e in chamfer1_edges_6:
        chamfer1.Add(CHAMFER1_SIZE, CHAMFER1_SIZE2, e.wrapped, chamfer1_side_6[0].wrapped)  # the first distance lies on this face
    for e in chamfer1_edges_7:
        chamfer1.Add(CHAMFER1_SIZE, CHAMFER1_SIZE2, e.wrapped, chamfer1_side_7[0].wrapped)  # the first distance lies on this face
    for e in chamfer1_edges_8:
        chamfer1.Add(CHAMFER1_SIZE, CHAMFER1_SIZE2, e.wrapped, chamfer1_side_8[0].wrapped)  # the first distance lies on this face
    add(Compound.cast(chamfer1.Shape()), mode=Mode.REPLACE)


solid = part.part
